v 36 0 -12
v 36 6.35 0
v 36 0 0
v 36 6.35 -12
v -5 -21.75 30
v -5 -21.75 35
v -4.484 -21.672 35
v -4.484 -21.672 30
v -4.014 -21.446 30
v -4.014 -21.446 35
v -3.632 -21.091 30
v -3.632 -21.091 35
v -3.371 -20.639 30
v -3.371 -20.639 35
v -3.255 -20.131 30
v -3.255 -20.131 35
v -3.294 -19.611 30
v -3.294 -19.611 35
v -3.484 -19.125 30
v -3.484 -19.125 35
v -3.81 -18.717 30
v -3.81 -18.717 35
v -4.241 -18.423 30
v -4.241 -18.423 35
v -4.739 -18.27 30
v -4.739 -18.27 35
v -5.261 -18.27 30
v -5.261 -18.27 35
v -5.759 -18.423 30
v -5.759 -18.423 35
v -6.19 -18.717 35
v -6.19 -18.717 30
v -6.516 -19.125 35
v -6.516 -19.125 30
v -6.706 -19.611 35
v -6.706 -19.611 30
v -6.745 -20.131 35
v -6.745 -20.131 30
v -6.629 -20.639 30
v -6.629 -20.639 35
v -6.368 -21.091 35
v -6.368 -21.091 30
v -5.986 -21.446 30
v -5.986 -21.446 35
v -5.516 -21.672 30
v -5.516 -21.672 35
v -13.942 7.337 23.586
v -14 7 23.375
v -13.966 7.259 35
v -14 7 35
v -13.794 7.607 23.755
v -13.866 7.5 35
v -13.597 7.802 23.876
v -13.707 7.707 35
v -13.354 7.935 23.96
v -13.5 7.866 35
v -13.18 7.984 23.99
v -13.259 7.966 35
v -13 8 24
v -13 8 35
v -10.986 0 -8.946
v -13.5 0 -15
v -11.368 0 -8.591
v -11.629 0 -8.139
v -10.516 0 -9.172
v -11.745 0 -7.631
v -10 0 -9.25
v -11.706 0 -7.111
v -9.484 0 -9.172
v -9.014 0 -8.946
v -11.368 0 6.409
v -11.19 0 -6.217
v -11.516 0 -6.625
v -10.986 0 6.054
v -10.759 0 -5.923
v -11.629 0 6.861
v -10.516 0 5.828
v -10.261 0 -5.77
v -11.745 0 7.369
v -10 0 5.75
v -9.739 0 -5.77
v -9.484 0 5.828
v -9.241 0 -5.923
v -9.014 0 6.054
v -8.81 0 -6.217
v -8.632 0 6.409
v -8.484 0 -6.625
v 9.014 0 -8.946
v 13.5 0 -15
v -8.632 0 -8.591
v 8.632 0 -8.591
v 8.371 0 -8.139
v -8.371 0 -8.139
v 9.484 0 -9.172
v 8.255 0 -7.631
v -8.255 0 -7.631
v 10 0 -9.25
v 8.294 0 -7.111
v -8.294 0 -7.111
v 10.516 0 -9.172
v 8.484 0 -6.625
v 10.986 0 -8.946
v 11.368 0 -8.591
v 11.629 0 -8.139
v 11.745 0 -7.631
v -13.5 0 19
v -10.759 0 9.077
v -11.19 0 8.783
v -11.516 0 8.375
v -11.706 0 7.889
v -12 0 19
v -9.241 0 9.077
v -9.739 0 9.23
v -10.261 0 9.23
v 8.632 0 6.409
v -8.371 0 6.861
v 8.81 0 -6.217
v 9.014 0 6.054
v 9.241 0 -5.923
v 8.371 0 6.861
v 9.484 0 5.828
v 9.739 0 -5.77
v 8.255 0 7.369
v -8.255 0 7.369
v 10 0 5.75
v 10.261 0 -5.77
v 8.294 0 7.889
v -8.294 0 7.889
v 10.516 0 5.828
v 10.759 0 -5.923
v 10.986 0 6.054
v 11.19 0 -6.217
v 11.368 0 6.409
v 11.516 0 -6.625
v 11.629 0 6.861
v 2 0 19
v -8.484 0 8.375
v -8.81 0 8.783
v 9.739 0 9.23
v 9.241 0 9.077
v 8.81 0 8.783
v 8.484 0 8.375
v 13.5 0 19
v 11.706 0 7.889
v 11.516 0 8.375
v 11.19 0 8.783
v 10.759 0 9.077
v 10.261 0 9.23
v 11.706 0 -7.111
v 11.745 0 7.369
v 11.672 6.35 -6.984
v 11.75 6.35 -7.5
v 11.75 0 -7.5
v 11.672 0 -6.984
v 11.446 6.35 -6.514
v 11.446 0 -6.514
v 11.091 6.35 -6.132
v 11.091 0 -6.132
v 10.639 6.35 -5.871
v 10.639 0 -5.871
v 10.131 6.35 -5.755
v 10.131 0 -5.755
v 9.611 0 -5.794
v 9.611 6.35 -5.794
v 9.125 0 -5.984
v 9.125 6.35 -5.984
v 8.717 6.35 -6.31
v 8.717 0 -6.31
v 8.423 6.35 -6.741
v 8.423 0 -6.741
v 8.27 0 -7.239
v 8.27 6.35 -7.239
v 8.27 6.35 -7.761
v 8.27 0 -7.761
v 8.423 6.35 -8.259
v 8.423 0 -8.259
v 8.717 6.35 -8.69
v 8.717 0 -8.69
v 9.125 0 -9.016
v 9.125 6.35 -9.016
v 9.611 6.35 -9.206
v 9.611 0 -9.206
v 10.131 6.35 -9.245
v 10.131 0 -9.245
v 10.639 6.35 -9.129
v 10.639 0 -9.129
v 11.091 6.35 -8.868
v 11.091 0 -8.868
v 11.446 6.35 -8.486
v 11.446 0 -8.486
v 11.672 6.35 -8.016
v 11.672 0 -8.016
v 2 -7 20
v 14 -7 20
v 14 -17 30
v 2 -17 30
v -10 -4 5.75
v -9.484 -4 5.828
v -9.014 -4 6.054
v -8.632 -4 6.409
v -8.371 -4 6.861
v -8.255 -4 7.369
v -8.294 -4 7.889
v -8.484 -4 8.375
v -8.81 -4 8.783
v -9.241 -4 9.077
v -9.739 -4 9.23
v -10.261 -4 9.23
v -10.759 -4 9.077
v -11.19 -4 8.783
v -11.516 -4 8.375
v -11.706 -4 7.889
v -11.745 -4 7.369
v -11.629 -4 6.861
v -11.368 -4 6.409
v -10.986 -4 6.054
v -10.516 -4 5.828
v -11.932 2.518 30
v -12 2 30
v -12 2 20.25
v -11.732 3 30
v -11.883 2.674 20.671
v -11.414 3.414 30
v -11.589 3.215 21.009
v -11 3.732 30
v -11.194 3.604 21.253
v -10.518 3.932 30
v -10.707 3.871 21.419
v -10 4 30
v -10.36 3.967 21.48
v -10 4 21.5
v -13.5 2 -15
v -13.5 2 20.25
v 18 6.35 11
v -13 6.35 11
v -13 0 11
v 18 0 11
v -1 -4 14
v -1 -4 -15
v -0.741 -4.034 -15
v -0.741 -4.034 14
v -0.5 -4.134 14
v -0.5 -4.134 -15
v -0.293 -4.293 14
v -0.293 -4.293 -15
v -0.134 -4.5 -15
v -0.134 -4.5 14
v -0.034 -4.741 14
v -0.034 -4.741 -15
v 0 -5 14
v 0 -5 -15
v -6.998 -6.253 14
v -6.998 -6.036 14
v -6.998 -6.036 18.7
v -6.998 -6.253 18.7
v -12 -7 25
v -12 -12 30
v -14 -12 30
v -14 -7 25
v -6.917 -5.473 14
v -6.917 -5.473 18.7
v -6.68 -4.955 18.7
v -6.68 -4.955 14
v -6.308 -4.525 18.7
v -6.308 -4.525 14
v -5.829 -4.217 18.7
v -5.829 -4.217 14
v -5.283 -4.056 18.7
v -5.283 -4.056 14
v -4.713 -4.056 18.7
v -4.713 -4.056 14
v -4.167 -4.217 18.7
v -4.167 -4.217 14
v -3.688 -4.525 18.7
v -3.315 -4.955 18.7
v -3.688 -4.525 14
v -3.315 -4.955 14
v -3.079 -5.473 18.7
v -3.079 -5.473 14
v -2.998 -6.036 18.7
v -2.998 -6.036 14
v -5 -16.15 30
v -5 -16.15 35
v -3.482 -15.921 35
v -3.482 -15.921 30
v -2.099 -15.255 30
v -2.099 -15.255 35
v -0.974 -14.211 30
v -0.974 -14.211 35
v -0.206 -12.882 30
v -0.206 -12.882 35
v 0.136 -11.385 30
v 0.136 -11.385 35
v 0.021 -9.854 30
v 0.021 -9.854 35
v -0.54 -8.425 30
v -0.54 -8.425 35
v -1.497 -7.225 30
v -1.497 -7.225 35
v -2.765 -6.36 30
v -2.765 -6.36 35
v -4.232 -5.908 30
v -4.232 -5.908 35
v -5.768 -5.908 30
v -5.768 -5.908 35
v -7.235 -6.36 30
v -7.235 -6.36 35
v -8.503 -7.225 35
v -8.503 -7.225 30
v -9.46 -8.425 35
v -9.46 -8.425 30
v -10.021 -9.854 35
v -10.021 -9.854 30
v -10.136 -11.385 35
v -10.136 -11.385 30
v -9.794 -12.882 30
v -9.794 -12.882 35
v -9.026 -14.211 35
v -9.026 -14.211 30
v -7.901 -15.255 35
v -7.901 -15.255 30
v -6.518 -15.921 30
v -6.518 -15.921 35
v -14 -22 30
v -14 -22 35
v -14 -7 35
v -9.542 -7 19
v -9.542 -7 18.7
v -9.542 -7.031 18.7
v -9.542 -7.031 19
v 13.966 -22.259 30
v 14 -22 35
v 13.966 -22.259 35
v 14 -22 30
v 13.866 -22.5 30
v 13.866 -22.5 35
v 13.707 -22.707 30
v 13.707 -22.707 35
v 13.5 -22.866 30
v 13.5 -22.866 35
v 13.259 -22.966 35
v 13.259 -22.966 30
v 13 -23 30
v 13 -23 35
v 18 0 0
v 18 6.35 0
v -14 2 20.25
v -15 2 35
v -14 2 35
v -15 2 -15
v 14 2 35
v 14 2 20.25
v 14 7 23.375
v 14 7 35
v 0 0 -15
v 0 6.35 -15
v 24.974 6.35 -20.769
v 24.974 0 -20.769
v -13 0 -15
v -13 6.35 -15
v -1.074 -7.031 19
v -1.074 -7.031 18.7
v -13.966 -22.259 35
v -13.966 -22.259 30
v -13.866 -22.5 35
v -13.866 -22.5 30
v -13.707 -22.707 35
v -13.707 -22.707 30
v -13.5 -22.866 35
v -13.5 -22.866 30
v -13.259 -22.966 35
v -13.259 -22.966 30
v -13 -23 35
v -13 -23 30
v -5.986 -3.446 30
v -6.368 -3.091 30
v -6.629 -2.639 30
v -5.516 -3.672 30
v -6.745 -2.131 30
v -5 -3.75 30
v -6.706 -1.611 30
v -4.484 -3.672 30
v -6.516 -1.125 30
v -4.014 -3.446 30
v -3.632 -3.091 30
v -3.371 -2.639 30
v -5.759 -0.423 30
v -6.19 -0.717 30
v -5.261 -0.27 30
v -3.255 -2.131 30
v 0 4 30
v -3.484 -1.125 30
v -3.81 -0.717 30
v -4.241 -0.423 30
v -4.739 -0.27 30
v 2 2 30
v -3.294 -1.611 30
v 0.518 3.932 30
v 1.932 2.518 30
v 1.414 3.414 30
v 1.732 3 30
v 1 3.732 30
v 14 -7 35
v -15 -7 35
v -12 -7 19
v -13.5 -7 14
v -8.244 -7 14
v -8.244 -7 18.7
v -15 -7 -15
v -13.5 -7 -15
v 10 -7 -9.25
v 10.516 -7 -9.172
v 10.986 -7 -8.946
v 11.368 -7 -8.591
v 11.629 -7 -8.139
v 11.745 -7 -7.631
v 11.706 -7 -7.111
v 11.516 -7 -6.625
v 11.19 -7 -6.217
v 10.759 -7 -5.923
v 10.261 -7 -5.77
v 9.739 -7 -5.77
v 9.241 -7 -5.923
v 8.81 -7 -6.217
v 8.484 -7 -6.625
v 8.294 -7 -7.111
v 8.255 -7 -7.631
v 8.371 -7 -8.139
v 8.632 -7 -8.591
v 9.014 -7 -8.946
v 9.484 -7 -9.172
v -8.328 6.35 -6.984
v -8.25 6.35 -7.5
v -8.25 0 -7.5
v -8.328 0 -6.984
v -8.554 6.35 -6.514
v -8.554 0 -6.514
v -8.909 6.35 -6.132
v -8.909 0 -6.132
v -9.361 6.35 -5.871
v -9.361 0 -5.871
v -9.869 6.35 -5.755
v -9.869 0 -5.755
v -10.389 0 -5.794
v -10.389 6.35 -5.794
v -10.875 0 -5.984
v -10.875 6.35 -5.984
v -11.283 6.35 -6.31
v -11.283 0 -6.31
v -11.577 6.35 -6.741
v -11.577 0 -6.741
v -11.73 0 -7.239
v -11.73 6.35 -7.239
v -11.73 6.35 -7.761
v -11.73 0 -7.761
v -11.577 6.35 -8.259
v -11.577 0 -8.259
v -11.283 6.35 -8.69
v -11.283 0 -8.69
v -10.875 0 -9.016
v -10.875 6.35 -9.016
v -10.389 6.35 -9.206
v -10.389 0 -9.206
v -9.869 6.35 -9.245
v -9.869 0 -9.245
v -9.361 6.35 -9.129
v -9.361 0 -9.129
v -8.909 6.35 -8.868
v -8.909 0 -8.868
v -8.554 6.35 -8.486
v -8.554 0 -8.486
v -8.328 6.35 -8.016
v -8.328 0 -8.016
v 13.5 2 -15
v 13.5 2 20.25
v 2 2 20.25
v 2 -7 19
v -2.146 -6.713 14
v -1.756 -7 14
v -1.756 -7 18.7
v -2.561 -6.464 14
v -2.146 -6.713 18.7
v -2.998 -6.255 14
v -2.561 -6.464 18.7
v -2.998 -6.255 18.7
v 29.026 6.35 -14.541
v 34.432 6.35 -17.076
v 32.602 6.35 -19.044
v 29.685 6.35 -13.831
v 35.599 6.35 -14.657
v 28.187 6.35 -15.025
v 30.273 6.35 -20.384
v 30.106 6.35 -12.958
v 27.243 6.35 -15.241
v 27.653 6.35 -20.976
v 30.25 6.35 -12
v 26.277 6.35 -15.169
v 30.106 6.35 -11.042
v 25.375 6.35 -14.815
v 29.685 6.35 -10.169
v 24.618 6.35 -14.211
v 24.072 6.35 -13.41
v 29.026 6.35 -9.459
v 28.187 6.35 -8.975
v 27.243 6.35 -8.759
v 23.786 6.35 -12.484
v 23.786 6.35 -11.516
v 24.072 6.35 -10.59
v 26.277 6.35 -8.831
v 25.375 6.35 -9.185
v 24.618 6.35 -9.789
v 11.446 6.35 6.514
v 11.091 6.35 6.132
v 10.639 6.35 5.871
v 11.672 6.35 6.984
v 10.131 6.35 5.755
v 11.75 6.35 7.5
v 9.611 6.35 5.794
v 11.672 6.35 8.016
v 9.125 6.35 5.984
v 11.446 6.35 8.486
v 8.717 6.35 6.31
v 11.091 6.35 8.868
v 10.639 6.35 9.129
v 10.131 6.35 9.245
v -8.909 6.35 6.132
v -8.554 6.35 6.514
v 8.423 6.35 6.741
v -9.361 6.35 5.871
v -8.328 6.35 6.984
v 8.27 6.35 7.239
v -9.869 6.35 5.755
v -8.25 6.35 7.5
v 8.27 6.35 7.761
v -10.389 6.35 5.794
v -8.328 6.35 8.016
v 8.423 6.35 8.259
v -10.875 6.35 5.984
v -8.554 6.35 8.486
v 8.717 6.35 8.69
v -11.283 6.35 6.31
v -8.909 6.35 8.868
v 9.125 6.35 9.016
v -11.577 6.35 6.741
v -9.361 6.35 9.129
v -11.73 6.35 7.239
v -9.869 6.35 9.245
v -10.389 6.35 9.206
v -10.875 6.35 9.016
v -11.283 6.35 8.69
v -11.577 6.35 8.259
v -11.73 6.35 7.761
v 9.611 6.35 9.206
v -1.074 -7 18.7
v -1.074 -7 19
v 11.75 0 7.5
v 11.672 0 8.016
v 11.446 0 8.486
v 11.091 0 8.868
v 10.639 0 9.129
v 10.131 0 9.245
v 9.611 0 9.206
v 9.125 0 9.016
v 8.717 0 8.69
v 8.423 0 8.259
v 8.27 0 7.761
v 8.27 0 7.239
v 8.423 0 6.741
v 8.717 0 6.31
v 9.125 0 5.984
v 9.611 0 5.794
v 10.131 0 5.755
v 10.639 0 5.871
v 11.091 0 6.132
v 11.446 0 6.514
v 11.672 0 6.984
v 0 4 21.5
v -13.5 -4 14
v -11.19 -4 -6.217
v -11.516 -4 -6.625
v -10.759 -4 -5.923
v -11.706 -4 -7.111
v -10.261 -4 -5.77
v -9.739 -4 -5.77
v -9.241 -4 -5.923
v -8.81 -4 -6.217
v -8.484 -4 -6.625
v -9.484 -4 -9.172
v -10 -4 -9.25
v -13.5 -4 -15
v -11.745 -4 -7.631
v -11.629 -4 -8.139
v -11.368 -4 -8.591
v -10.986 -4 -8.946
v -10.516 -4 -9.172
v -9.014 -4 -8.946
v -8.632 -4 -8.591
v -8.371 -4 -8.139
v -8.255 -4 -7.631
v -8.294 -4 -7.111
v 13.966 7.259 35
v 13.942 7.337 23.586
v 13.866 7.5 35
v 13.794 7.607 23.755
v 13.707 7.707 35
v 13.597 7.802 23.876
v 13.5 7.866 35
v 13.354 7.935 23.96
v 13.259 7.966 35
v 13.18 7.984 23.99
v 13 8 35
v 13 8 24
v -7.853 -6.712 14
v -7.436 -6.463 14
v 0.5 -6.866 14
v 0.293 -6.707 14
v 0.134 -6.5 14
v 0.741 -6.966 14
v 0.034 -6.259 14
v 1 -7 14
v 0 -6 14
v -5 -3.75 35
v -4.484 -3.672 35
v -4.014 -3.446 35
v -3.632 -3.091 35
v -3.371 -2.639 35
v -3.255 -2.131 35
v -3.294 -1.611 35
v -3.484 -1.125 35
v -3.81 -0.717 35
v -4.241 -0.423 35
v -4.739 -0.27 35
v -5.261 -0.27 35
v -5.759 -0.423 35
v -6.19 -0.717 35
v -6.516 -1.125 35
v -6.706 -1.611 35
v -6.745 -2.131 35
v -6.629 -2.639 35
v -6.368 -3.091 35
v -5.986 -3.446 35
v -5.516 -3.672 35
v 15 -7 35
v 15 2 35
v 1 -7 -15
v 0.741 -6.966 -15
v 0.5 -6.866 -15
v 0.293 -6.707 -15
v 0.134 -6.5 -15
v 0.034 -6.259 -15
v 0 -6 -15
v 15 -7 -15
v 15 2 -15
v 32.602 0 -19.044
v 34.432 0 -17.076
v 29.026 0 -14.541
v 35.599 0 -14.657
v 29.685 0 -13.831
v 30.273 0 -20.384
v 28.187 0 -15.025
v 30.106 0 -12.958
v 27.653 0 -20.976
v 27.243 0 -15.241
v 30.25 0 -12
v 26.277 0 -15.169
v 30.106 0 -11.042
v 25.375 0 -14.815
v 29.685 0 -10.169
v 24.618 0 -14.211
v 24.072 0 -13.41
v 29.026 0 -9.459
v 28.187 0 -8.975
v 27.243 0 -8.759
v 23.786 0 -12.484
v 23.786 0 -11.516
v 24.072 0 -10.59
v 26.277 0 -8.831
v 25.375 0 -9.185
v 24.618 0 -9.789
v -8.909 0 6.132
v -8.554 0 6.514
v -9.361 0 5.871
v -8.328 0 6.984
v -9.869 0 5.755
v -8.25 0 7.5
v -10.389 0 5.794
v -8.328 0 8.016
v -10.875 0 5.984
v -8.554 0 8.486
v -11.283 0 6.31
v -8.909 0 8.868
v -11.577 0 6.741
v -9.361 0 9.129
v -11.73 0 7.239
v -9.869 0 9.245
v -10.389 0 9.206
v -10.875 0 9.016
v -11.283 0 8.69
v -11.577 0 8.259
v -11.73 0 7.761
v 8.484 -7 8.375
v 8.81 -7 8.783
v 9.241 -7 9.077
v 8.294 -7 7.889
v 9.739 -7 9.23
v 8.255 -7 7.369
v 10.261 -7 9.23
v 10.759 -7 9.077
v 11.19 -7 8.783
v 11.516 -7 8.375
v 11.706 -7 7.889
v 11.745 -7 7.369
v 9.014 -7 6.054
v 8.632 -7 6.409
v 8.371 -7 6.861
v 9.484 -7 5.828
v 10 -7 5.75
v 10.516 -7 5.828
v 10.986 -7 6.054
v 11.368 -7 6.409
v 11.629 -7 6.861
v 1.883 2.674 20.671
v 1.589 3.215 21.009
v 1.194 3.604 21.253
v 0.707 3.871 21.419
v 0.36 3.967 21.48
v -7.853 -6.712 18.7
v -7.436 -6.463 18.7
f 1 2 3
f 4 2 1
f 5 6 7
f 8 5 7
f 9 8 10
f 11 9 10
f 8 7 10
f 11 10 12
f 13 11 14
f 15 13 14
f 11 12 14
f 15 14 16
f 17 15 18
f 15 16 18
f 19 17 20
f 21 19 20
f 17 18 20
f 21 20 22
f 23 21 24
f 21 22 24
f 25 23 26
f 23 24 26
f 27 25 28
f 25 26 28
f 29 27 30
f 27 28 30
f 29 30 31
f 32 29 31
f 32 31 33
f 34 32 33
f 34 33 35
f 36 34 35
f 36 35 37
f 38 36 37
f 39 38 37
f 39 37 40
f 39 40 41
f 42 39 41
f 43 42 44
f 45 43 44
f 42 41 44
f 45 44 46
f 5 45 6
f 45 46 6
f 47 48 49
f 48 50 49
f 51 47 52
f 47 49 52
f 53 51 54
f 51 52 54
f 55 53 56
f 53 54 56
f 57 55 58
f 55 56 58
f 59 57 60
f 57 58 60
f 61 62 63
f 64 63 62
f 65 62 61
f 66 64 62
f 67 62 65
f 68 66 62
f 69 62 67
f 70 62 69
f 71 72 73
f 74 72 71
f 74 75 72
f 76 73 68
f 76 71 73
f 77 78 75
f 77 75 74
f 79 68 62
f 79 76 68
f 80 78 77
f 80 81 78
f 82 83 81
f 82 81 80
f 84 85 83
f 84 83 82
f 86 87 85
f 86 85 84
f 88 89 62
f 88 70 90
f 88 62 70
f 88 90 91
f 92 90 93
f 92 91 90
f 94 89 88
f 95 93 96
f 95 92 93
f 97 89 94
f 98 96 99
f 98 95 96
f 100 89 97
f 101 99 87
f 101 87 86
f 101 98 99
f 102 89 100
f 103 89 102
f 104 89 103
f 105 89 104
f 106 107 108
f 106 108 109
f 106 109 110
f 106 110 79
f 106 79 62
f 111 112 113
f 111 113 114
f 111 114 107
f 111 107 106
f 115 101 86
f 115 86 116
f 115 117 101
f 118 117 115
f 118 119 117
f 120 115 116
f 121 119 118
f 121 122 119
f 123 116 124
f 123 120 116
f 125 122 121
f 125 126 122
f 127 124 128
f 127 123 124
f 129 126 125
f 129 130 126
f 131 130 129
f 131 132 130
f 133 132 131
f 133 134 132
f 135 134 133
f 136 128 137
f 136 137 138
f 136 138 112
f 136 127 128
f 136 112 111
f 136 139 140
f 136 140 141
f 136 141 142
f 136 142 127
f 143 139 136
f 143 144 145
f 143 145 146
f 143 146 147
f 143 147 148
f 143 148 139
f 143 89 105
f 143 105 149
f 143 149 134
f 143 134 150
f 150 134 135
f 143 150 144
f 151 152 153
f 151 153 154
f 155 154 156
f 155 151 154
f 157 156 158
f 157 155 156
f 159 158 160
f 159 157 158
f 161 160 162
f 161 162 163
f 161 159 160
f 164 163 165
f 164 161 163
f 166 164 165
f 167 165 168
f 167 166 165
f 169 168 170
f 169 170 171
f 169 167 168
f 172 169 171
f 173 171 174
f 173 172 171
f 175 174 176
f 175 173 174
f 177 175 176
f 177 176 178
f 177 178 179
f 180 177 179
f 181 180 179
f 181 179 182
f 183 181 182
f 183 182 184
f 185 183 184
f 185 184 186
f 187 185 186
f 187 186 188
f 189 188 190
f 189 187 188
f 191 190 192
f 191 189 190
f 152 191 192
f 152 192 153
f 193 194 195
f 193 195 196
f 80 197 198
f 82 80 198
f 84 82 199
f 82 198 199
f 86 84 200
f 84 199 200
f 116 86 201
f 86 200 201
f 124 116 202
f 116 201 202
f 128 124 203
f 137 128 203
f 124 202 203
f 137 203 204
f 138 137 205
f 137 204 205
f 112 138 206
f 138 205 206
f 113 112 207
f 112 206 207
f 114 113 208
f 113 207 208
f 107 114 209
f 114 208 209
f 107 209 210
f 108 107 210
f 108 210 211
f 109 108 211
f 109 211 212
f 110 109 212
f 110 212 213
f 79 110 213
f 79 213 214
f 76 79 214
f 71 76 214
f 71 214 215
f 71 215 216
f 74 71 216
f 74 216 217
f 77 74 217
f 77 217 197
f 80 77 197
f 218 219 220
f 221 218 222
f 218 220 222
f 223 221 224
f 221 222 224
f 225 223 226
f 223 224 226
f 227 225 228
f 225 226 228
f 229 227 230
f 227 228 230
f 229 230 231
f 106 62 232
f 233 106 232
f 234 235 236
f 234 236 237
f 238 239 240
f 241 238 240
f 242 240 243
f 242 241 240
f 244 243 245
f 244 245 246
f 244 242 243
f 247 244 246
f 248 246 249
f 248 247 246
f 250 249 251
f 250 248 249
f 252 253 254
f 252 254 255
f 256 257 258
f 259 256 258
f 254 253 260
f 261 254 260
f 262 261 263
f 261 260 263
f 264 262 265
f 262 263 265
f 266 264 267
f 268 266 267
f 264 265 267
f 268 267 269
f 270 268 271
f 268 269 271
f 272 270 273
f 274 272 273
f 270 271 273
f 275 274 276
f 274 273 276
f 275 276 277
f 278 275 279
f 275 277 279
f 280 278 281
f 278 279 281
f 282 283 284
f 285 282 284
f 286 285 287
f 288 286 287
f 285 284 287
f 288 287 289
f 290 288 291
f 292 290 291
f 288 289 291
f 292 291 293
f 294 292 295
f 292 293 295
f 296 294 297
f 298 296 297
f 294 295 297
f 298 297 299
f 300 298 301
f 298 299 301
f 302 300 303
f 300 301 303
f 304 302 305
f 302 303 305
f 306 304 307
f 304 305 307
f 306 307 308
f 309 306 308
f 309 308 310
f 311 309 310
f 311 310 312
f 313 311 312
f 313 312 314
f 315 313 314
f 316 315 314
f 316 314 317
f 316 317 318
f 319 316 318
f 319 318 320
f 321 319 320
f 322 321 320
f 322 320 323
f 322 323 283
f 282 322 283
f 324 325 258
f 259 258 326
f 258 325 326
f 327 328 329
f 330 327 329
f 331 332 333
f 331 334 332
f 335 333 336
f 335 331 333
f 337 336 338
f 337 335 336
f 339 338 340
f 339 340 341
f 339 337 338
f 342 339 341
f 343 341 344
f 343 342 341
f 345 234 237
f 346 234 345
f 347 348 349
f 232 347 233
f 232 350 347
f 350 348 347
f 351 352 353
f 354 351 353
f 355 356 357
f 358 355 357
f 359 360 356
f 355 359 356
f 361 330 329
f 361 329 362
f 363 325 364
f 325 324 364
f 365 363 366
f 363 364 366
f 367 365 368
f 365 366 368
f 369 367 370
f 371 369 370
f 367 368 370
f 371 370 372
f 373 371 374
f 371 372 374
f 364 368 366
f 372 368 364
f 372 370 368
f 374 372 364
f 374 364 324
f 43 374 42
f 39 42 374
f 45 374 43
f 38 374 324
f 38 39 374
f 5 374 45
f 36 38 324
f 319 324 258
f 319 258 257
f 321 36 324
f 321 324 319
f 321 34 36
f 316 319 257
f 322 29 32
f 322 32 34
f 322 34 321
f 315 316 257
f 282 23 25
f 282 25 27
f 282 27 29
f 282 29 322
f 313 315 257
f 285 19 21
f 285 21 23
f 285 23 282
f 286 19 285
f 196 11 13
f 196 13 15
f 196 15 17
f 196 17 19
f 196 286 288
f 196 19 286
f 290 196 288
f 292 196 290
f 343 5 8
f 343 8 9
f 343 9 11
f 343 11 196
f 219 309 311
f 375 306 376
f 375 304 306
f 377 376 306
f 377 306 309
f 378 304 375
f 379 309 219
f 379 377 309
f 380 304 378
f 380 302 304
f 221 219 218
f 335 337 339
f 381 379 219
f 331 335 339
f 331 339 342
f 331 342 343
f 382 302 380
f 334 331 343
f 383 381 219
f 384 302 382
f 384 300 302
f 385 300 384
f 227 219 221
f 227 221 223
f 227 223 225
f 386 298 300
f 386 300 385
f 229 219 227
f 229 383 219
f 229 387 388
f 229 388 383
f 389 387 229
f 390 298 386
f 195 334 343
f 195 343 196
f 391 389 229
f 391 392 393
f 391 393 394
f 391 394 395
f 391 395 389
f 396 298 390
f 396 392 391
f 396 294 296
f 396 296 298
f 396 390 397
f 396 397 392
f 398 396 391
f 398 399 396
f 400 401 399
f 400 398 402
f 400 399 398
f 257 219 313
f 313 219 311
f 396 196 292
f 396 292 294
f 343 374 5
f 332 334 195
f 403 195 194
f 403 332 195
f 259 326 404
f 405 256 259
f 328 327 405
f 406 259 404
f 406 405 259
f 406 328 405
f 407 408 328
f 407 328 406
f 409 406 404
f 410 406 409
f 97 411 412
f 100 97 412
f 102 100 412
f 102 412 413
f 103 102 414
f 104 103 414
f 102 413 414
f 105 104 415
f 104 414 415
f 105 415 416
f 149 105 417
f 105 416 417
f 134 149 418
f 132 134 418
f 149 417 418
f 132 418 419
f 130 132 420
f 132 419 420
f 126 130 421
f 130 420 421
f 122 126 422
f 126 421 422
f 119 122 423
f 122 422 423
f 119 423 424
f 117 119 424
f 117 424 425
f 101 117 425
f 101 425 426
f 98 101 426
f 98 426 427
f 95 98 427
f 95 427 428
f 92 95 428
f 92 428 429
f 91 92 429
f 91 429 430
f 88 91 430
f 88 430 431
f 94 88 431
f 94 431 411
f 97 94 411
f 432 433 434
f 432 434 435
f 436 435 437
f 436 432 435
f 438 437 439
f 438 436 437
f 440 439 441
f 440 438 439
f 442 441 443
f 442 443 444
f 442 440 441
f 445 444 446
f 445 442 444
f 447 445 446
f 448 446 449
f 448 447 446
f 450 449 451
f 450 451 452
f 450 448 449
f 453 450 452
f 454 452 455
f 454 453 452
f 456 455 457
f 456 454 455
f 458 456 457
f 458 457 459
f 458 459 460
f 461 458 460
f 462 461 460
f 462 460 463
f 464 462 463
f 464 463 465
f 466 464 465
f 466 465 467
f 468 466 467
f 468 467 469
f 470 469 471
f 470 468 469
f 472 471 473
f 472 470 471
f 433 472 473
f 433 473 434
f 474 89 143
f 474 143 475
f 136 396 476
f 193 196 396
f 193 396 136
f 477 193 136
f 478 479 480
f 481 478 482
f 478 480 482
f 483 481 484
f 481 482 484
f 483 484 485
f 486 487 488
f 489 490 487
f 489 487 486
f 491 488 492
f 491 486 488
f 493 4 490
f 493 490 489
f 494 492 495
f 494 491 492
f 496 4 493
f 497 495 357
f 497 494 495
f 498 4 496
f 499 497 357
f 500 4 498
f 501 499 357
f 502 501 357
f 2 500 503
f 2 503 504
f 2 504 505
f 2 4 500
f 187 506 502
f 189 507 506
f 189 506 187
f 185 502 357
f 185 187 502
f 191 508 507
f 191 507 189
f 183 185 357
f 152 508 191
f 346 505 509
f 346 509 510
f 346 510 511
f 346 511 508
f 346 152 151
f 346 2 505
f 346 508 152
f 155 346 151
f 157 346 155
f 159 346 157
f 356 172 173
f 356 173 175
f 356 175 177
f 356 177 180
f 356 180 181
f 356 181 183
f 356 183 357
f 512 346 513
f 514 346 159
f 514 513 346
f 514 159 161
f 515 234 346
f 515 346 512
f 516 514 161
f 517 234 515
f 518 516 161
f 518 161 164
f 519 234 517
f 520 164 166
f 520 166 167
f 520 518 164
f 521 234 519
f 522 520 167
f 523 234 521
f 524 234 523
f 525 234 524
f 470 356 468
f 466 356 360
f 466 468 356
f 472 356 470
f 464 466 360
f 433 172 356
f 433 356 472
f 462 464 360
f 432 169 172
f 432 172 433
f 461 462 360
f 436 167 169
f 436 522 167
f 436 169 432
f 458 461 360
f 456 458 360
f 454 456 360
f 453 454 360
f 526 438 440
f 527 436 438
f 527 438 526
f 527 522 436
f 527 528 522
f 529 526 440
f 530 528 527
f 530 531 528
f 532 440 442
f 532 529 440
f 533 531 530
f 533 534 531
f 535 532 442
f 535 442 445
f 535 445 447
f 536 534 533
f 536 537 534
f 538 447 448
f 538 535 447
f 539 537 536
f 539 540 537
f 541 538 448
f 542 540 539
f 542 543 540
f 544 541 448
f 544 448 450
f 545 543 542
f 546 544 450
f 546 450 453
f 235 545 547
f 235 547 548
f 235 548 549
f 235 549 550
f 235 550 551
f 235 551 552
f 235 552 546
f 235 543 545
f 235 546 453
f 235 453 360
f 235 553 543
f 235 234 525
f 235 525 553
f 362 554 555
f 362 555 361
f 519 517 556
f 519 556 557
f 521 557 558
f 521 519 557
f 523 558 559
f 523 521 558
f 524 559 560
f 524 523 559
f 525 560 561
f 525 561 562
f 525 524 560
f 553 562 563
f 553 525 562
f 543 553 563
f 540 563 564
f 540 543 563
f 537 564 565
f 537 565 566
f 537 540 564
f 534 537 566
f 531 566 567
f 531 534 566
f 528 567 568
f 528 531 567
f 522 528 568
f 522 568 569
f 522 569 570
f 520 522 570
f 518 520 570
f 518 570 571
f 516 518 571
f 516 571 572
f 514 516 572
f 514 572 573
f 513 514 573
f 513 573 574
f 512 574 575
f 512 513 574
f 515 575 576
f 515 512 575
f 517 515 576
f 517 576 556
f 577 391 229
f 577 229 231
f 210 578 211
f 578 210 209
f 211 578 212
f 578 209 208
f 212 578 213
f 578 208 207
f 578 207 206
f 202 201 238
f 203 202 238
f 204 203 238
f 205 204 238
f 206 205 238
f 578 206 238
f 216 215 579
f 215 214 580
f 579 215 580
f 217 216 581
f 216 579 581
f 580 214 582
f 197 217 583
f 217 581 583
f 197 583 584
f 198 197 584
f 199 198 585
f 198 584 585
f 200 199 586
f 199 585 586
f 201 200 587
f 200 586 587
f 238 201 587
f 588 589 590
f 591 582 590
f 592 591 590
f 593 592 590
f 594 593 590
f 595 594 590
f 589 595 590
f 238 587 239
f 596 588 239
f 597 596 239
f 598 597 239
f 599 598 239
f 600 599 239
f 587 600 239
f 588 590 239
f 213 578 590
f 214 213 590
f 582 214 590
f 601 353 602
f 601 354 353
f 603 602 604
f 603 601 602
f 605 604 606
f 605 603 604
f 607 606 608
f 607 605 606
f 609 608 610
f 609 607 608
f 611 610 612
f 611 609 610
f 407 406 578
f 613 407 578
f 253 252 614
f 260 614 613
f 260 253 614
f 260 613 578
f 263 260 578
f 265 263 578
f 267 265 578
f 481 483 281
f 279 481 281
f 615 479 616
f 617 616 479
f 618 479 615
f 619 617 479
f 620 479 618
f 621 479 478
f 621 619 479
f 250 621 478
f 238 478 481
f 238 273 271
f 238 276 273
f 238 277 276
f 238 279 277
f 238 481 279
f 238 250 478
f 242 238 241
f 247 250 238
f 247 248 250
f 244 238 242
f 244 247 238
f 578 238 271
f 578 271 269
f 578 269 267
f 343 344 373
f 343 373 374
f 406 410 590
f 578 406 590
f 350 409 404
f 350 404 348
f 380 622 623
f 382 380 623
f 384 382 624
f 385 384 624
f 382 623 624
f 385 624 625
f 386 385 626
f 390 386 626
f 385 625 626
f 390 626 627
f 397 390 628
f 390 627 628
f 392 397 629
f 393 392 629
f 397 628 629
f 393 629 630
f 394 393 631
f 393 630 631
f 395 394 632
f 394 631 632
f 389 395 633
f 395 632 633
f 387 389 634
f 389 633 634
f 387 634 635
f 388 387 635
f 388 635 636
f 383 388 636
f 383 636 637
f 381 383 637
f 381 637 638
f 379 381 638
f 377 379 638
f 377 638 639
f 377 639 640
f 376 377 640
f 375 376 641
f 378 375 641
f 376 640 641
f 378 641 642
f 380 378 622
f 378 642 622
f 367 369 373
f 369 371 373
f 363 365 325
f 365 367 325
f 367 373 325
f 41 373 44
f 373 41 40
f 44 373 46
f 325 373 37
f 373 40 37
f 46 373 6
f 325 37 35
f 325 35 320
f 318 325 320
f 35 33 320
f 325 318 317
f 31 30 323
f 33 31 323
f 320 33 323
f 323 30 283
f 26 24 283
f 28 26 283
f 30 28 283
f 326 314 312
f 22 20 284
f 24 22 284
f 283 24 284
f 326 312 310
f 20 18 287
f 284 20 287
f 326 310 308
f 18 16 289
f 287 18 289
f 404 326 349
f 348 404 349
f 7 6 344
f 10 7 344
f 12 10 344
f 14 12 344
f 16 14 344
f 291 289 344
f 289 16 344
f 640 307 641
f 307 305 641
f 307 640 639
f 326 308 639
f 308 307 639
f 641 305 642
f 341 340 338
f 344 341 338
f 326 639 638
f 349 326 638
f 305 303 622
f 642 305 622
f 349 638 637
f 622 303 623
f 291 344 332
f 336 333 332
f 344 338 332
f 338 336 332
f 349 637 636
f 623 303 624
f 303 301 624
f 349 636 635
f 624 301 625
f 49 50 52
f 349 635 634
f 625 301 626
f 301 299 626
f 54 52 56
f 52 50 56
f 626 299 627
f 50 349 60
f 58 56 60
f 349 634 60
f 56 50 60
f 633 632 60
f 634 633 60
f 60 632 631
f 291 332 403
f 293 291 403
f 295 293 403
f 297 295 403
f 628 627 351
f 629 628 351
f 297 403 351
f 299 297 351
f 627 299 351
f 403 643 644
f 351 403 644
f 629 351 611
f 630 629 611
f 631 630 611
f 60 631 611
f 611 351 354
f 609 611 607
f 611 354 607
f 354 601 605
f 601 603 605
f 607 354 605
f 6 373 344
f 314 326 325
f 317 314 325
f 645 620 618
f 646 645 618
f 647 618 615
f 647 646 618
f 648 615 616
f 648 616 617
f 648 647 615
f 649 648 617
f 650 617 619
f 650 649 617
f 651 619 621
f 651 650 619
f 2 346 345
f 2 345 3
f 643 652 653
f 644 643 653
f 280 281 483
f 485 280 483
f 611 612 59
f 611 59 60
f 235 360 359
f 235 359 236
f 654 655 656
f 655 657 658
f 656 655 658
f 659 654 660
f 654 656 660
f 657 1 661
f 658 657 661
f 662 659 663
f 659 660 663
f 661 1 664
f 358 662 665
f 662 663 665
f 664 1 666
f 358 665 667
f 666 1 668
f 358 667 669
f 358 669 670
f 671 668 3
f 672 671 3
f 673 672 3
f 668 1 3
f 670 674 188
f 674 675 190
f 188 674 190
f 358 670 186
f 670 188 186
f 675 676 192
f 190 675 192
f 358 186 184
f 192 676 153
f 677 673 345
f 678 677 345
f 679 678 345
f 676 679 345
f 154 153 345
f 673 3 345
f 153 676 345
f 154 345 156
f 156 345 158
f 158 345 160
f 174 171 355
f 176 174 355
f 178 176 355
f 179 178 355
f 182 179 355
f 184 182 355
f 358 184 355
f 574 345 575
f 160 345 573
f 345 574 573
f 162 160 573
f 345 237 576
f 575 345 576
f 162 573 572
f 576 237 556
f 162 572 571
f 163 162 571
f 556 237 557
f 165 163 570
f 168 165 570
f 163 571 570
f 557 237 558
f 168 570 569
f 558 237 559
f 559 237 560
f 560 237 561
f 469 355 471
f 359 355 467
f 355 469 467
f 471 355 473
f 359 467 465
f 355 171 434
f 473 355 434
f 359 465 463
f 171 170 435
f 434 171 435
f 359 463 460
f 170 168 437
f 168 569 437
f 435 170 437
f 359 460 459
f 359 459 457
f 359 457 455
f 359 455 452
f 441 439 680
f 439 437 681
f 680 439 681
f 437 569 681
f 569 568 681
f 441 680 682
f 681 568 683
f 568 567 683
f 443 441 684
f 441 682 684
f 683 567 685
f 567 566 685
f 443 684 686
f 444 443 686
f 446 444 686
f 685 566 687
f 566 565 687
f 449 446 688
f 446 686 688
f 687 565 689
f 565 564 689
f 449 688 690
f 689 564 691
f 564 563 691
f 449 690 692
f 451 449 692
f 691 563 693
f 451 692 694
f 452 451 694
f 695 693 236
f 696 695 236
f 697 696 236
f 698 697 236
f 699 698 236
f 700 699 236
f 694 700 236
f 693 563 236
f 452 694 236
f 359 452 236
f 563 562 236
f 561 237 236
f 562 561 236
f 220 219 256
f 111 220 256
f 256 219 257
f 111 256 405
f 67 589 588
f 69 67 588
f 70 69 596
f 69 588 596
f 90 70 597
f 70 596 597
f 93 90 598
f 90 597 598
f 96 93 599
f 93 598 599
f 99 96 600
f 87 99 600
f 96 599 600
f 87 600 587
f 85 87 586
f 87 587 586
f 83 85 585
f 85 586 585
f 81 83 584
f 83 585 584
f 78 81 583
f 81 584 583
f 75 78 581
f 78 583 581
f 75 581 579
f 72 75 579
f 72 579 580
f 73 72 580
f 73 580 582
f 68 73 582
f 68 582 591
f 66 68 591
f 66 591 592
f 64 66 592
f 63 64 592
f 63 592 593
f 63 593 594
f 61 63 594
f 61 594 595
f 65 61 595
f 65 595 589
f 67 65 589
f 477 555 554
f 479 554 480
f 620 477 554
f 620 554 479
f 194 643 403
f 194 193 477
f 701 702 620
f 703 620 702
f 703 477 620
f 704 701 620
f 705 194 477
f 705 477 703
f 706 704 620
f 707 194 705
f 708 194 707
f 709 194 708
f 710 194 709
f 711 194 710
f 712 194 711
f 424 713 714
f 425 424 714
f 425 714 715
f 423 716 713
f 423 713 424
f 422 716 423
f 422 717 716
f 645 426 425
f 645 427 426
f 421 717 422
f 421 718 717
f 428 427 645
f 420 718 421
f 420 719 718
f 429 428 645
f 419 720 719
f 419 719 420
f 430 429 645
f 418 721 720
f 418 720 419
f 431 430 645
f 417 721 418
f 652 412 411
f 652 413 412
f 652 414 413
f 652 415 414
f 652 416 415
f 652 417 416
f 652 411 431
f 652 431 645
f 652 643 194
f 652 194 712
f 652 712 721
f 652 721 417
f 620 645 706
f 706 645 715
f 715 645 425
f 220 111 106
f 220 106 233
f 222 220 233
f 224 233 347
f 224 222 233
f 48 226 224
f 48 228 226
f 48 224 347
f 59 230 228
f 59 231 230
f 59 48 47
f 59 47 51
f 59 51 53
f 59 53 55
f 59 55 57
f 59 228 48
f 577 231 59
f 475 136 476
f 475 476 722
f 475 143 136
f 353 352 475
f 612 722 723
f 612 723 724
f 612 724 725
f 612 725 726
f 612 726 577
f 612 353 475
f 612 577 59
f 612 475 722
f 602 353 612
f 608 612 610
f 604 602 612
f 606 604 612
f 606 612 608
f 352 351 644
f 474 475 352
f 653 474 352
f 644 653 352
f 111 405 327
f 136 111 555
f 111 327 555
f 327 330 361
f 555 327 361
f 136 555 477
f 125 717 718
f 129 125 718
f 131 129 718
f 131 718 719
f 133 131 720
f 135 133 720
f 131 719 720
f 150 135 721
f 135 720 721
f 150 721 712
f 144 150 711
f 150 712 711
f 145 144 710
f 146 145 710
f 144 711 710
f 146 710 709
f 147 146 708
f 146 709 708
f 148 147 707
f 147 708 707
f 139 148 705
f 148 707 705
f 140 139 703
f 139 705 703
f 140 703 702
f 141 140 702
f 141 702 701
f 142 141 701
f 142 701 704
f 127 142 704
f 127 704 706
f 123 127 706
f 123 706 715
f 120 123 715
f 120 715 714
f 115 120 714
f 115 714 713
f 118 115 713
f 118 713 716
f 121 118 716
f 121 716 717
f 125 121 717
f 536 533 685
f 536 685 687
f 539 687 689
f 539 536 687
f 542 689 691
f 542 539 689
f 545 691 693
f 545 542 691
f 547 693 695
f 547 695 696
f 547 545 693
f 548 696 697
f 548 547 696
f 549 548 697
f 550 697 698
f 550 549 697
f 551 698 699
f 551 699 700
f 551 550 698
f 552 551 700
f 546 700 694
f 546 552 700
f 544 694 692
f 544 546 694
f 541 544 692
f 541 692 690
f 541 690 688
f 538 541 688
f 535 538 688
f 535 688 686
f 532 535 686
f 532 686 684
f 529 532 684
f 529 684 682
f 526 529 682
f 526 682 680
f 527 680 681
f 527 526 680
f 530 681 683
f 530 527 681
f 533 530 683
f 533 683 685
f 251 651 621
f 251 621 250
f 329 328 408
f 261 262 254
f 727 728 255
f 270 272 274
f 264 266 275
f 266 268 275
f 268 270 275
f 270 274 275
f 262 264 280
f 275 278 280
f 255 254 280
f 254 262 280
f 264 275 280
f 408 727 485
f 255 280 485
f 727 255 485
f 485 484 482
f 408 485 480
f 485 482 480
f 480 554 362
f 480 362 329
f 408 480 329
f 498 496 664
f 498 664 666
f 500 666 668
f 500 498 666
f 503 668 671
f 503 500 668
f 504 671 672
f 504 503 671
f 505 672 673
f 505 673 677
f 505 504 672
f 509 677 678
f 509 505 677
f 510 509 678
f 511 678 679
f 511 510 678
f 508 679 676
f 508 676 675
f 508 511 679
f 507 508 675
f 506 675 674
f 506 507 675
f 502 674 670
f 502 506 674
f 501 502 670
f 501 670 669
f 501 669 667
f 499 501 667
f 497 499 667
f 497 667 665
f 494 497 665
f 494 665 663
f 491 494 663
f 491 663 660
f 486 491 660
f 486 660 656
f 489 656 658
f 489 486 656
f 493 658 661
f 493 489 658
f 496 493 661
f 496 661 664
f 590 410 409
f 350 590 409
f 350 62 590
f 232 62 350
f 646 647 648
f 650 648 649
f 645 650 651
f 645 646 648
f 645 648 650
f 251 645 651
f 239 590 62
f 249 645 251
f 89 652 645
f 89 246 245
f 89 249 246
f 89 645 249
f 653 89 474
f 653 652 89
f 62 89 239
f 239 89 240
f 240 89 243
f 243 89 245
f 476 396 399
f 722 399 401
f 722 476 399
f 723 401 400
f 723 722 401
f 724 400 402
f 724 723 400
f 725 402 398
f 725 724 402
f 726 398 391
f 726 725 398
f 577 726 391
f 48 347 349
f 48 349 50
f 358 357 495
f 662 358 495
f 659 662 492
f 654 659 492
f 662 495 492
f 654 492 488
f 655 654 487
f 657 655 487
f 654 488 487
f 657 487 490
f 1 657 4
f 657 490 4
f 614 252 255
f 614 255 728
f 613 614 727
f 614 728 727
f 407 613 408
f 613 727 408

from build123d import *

# Parameters (mm, degrees)
SKETCH_R          = 1.75
SKETCH_R_2        = 3.25
PAD_DEPTH         = 6.35
PAD001_DEPTH      = 14
PAD001_DEPTH_BACK = 14
SKETCH003_R       = 1.75
POCKET_DEPTH      = 6
SKETCH010_W       = 11
SKETCH010_H       = 14
POCKET001_DEPTH   = 11
SKETCH007_R       = 1.75
POCKET002_DEPTH   = 16.001
SKETCH008_W       = 7.043208
SKETCH008_H       = 14
POCKET003_DEPTH   = 32
SKETCH013_R       = 1.75
POCKET004_DEPTH   = 5
SKETCH012_R       = 5.15
POCKET005_DEPTH   = 50.001
POCKET006_DEPTH   = 5
SKETCH017_W       = 3.890195
SKETCH017_H       = 8.467605
PAD002_DEPTH      = 0.3
FILLET_R          = 1
FILLET001_R       = 2
FILLET002_R       = 1
CHAMFER_SIZE      = 10
CHAMFER001_SIZE   = 5
SKETCH018_W       = 9
SKETCH018_H       = 1.5
PAD003_DEPTH      = 50


with BuildPart() as tab:
    # Sketch → Pad (new body)
    with BuildSketch(Plane.XZ):
        with BuildLine():
            Line((-13, 11), (18, 11))
            Line((18, 11), (18, 0))
            Line((18, 0), (36, 0))
            Line((36, 0), (36, -12))
            ThreePointArc((24.974342, -20.769077), (32.602191, -19.043824), (36, -12))
            Line((0, -15), (24.974342, -20.769077))
            Line((-13, -15), (0, -15))
            Line((-13, -15), (-13, 11))
        make_face()
        with Locations((-10, 7.5)):
            Circle(SKETCH_R, mode=Mode.SUBTRACT)
        with Locations((10, 7.5)):
            Circle(SKETCH_R, mode=Mode.SUBTRACT)
        with Locations((-10, -7.5)):
            Circle(SKETCH_R, mode=Mode.SUBTRACT)
        with Locations((10, -7.5)):
            Circle(SKETCH_R, mode=Mode.SUBTRACT)
        with Locations((27, -12)):
            Circle(SKETCH_R_2, mode=Mode.SUBTRACT)
    extrude(amount=PAD_DEPTH)


with BuildPart() as tab_1:
    # Body placement: moved
    add(tab.part.moved(Location((0, 6.35, 0))))


with BuildPart() as leadscrewmount:
    # Sketch005 → Pad001 (new body, two sides)
    with BuildSketch(Plane.YZ) as pad001_sk:
        Polygon((0, -15), (0, 19), (8, 24), (8, 35), (-23, 35), (-23, 30), (-7, 30), (-7, -15), align=None)
    extrude(amount=PAD001_DEPTH)
    extrude(pad001_sk.sketch, amount=-PAD001_DEPTH_BACK)

    # Sketch003 → Pocket (cut)
    with BuildSketch(Plane(origin=(0, 0, 29), x_dir=(-1, 0, 0), z_dir=(0, 0, 1))):
        with Locations((5, 21.5)):
            Circle(SKETCH003_R)
        with Locations((5, 3.5)):
            Circle(SKETCH003_R)
    extrude(amount=-POCKET_DEPTH, mode=Mode.SUBTRACT)

    # Sketch010 (on Face6 of Pocket) → Pocket001 (cut)
    with BuildSketch(Plane(origin=(0, -7, 0), x_dir=(0, 0, -1), z_dir=(0, -1, 0))):
        with Locations((-24.5, -5)):
            Rectangle(SKETCH010_W, SKETCH010_H)
    extrude(amount=-POCKET001_DEPTH, mode=Mode.SUBTRACT)

    # Sketch007 → Pocket002 (cut, through all)
    with BuildSketch(Plane(origin=(0, -8, 0), x_dir=(0, 0, -1), z_dir=(0, -1, 0))):
        with Locations((-7.5, 10)):
            Circle(SKETCH007_R)
        with Locations((7.5, 10)):
            Circle(SKETCH007_R)
        with Locations((-7.5, -10)):
            Circle(SKETCH007_R)
        with Locations((7.5, -10)):
            Circle(SKETCH007_R)
    extrude(amount=-POCKET002_DEPTH, mode=Mode.SUBTRACT)

    # Sketch008 → Pocket003 (cut)
    with BuildSketch(Plane.YX.offset(18)):
        with Locations((-7.521604, -7)):
            Rectangle(SKETCH008_W, SKETCH008_H)
    extrude(amount=-POCKET003_DEPTH, mode=Mode.SUBTRACT)

    # Sketch013 → Pocket004 (cut)
    with BuildSketch(Plane(origin=(0, 0, 35), x_dir=(0, -1, 0), z_dir=(0, 0, 1))):
        with Locations((2, -5)):
            Circle(SKETCH013_R)
        with Locations((20, -5)):
            Circle(SKETCH013_R)
    extrude(amount=-POCKET004_DEPTH, mode=Mode.SUBTRACT)

    # Sketch012 → Pocket005 (cut, through all)
    with BuildSketch(Plane(origin=(0, 0, 35), x_dir=(0, -1, 0), z_dir=(0, 0, 1))):
        with Locations((11, -5)):
            Circle(SKETCH012_R)
    extrude(amount=-POCKET005_DEPTH, mode=Mode.SUBTRACT)

    # Sketch016 → Pocket006 (cut)
    with BuildSketch(Plane.YX.offset(-14)):
        with BuildLine():
            ThreePointArc((-6.036054, -6.997931), (-4.036054, -4.997931), (-6.036054, -2.997931))
            Line((-6.036054, -2.997931), (-13.535141, -2.997931))
            ThreePointArc((-13.535141, -2.997931), (-15.535141, -4.997931), (-13.535141, -6.997931))
            Line((-6.036054, -6.997931), (-13.535141, -6.997931))
        make_face()
    extrude(amount=-POCKET006_DEPTH, mode=Mode.SUBTRACT)

    # Sketch017 (on Face6 of Pocket005) → Pad002 (join)
    with BuildSketch(Plane(origin=(0, 0, 19), x_dir=(0, -1, 0), z_dir=(0, 0, 1))):
        with Locations((5.08562, -5.307749)):
            Rectangle(SKETCH017_W, SKETCH017_H)
    extrude(amount=-PAD002_DEPTH)

    # Fillet
    fillet_edges = [leadscrewmount.edges().sort_by_distance(p)[0] for p in [
        (-14, -23, 32.5),
        (14, -23, 32.5),
        (14, 8, 29.5),
        (-14, 8, 29.5),
    ]]
    fillet(fillet_edges, radius=FILLET_R)

    # Fillet001
    fillet001_edges = [leadscrewmount.edges().sort_by_distance(p)[0] for p in [
        (2, 4, 25.75),
        (-12, 4, 25.75),
    ]]
    fillet(fillet001_edges, radius=FILLET001_R)

    # Fillet002
    fillet002_edges = [leadscrewmount.edges().sort_by_distance(p)[0] for p in [
        (0, -7, -0.5),
        (0, -4, -0.5),
    ]]
    fillet(fillet002_edges, radius=FILLET002_R)

    # Chamfer
    chamfer_edges = [leadscrewmount.edges().sort_by_distance(p)[0] for p in [
        (8, -7, 30),
    ]]
    chamfer(chamfer_edges, length=CHAMFER_SIZE)

    # Chamfer001
    chamfer001_edges = [leadscrewmount.edges().sort_by_distance(p)[0] for p in [
        (-13, -7, 30),
    ]]
    chamfer(chamfer001_edges, length=CHAMFER001_SIZE)

    # Sketch018 (on Face20 of Chamfer001) → Pad003 (join)
    with BuildSketch(Plane.YX.offset(15)):
        with Locations((-2.5, 14.25)):
            Rectangle(SKETCH018_W, SKETCH018_H)
        with Locations((-2.5, -14.25)):
            Rectangle(SKETCH018_W, SKETCH018_H)
    extrude(amount=-PAD003_DEPTH)


solid = Compound([tab_1.part, leadscrewmount.part])
